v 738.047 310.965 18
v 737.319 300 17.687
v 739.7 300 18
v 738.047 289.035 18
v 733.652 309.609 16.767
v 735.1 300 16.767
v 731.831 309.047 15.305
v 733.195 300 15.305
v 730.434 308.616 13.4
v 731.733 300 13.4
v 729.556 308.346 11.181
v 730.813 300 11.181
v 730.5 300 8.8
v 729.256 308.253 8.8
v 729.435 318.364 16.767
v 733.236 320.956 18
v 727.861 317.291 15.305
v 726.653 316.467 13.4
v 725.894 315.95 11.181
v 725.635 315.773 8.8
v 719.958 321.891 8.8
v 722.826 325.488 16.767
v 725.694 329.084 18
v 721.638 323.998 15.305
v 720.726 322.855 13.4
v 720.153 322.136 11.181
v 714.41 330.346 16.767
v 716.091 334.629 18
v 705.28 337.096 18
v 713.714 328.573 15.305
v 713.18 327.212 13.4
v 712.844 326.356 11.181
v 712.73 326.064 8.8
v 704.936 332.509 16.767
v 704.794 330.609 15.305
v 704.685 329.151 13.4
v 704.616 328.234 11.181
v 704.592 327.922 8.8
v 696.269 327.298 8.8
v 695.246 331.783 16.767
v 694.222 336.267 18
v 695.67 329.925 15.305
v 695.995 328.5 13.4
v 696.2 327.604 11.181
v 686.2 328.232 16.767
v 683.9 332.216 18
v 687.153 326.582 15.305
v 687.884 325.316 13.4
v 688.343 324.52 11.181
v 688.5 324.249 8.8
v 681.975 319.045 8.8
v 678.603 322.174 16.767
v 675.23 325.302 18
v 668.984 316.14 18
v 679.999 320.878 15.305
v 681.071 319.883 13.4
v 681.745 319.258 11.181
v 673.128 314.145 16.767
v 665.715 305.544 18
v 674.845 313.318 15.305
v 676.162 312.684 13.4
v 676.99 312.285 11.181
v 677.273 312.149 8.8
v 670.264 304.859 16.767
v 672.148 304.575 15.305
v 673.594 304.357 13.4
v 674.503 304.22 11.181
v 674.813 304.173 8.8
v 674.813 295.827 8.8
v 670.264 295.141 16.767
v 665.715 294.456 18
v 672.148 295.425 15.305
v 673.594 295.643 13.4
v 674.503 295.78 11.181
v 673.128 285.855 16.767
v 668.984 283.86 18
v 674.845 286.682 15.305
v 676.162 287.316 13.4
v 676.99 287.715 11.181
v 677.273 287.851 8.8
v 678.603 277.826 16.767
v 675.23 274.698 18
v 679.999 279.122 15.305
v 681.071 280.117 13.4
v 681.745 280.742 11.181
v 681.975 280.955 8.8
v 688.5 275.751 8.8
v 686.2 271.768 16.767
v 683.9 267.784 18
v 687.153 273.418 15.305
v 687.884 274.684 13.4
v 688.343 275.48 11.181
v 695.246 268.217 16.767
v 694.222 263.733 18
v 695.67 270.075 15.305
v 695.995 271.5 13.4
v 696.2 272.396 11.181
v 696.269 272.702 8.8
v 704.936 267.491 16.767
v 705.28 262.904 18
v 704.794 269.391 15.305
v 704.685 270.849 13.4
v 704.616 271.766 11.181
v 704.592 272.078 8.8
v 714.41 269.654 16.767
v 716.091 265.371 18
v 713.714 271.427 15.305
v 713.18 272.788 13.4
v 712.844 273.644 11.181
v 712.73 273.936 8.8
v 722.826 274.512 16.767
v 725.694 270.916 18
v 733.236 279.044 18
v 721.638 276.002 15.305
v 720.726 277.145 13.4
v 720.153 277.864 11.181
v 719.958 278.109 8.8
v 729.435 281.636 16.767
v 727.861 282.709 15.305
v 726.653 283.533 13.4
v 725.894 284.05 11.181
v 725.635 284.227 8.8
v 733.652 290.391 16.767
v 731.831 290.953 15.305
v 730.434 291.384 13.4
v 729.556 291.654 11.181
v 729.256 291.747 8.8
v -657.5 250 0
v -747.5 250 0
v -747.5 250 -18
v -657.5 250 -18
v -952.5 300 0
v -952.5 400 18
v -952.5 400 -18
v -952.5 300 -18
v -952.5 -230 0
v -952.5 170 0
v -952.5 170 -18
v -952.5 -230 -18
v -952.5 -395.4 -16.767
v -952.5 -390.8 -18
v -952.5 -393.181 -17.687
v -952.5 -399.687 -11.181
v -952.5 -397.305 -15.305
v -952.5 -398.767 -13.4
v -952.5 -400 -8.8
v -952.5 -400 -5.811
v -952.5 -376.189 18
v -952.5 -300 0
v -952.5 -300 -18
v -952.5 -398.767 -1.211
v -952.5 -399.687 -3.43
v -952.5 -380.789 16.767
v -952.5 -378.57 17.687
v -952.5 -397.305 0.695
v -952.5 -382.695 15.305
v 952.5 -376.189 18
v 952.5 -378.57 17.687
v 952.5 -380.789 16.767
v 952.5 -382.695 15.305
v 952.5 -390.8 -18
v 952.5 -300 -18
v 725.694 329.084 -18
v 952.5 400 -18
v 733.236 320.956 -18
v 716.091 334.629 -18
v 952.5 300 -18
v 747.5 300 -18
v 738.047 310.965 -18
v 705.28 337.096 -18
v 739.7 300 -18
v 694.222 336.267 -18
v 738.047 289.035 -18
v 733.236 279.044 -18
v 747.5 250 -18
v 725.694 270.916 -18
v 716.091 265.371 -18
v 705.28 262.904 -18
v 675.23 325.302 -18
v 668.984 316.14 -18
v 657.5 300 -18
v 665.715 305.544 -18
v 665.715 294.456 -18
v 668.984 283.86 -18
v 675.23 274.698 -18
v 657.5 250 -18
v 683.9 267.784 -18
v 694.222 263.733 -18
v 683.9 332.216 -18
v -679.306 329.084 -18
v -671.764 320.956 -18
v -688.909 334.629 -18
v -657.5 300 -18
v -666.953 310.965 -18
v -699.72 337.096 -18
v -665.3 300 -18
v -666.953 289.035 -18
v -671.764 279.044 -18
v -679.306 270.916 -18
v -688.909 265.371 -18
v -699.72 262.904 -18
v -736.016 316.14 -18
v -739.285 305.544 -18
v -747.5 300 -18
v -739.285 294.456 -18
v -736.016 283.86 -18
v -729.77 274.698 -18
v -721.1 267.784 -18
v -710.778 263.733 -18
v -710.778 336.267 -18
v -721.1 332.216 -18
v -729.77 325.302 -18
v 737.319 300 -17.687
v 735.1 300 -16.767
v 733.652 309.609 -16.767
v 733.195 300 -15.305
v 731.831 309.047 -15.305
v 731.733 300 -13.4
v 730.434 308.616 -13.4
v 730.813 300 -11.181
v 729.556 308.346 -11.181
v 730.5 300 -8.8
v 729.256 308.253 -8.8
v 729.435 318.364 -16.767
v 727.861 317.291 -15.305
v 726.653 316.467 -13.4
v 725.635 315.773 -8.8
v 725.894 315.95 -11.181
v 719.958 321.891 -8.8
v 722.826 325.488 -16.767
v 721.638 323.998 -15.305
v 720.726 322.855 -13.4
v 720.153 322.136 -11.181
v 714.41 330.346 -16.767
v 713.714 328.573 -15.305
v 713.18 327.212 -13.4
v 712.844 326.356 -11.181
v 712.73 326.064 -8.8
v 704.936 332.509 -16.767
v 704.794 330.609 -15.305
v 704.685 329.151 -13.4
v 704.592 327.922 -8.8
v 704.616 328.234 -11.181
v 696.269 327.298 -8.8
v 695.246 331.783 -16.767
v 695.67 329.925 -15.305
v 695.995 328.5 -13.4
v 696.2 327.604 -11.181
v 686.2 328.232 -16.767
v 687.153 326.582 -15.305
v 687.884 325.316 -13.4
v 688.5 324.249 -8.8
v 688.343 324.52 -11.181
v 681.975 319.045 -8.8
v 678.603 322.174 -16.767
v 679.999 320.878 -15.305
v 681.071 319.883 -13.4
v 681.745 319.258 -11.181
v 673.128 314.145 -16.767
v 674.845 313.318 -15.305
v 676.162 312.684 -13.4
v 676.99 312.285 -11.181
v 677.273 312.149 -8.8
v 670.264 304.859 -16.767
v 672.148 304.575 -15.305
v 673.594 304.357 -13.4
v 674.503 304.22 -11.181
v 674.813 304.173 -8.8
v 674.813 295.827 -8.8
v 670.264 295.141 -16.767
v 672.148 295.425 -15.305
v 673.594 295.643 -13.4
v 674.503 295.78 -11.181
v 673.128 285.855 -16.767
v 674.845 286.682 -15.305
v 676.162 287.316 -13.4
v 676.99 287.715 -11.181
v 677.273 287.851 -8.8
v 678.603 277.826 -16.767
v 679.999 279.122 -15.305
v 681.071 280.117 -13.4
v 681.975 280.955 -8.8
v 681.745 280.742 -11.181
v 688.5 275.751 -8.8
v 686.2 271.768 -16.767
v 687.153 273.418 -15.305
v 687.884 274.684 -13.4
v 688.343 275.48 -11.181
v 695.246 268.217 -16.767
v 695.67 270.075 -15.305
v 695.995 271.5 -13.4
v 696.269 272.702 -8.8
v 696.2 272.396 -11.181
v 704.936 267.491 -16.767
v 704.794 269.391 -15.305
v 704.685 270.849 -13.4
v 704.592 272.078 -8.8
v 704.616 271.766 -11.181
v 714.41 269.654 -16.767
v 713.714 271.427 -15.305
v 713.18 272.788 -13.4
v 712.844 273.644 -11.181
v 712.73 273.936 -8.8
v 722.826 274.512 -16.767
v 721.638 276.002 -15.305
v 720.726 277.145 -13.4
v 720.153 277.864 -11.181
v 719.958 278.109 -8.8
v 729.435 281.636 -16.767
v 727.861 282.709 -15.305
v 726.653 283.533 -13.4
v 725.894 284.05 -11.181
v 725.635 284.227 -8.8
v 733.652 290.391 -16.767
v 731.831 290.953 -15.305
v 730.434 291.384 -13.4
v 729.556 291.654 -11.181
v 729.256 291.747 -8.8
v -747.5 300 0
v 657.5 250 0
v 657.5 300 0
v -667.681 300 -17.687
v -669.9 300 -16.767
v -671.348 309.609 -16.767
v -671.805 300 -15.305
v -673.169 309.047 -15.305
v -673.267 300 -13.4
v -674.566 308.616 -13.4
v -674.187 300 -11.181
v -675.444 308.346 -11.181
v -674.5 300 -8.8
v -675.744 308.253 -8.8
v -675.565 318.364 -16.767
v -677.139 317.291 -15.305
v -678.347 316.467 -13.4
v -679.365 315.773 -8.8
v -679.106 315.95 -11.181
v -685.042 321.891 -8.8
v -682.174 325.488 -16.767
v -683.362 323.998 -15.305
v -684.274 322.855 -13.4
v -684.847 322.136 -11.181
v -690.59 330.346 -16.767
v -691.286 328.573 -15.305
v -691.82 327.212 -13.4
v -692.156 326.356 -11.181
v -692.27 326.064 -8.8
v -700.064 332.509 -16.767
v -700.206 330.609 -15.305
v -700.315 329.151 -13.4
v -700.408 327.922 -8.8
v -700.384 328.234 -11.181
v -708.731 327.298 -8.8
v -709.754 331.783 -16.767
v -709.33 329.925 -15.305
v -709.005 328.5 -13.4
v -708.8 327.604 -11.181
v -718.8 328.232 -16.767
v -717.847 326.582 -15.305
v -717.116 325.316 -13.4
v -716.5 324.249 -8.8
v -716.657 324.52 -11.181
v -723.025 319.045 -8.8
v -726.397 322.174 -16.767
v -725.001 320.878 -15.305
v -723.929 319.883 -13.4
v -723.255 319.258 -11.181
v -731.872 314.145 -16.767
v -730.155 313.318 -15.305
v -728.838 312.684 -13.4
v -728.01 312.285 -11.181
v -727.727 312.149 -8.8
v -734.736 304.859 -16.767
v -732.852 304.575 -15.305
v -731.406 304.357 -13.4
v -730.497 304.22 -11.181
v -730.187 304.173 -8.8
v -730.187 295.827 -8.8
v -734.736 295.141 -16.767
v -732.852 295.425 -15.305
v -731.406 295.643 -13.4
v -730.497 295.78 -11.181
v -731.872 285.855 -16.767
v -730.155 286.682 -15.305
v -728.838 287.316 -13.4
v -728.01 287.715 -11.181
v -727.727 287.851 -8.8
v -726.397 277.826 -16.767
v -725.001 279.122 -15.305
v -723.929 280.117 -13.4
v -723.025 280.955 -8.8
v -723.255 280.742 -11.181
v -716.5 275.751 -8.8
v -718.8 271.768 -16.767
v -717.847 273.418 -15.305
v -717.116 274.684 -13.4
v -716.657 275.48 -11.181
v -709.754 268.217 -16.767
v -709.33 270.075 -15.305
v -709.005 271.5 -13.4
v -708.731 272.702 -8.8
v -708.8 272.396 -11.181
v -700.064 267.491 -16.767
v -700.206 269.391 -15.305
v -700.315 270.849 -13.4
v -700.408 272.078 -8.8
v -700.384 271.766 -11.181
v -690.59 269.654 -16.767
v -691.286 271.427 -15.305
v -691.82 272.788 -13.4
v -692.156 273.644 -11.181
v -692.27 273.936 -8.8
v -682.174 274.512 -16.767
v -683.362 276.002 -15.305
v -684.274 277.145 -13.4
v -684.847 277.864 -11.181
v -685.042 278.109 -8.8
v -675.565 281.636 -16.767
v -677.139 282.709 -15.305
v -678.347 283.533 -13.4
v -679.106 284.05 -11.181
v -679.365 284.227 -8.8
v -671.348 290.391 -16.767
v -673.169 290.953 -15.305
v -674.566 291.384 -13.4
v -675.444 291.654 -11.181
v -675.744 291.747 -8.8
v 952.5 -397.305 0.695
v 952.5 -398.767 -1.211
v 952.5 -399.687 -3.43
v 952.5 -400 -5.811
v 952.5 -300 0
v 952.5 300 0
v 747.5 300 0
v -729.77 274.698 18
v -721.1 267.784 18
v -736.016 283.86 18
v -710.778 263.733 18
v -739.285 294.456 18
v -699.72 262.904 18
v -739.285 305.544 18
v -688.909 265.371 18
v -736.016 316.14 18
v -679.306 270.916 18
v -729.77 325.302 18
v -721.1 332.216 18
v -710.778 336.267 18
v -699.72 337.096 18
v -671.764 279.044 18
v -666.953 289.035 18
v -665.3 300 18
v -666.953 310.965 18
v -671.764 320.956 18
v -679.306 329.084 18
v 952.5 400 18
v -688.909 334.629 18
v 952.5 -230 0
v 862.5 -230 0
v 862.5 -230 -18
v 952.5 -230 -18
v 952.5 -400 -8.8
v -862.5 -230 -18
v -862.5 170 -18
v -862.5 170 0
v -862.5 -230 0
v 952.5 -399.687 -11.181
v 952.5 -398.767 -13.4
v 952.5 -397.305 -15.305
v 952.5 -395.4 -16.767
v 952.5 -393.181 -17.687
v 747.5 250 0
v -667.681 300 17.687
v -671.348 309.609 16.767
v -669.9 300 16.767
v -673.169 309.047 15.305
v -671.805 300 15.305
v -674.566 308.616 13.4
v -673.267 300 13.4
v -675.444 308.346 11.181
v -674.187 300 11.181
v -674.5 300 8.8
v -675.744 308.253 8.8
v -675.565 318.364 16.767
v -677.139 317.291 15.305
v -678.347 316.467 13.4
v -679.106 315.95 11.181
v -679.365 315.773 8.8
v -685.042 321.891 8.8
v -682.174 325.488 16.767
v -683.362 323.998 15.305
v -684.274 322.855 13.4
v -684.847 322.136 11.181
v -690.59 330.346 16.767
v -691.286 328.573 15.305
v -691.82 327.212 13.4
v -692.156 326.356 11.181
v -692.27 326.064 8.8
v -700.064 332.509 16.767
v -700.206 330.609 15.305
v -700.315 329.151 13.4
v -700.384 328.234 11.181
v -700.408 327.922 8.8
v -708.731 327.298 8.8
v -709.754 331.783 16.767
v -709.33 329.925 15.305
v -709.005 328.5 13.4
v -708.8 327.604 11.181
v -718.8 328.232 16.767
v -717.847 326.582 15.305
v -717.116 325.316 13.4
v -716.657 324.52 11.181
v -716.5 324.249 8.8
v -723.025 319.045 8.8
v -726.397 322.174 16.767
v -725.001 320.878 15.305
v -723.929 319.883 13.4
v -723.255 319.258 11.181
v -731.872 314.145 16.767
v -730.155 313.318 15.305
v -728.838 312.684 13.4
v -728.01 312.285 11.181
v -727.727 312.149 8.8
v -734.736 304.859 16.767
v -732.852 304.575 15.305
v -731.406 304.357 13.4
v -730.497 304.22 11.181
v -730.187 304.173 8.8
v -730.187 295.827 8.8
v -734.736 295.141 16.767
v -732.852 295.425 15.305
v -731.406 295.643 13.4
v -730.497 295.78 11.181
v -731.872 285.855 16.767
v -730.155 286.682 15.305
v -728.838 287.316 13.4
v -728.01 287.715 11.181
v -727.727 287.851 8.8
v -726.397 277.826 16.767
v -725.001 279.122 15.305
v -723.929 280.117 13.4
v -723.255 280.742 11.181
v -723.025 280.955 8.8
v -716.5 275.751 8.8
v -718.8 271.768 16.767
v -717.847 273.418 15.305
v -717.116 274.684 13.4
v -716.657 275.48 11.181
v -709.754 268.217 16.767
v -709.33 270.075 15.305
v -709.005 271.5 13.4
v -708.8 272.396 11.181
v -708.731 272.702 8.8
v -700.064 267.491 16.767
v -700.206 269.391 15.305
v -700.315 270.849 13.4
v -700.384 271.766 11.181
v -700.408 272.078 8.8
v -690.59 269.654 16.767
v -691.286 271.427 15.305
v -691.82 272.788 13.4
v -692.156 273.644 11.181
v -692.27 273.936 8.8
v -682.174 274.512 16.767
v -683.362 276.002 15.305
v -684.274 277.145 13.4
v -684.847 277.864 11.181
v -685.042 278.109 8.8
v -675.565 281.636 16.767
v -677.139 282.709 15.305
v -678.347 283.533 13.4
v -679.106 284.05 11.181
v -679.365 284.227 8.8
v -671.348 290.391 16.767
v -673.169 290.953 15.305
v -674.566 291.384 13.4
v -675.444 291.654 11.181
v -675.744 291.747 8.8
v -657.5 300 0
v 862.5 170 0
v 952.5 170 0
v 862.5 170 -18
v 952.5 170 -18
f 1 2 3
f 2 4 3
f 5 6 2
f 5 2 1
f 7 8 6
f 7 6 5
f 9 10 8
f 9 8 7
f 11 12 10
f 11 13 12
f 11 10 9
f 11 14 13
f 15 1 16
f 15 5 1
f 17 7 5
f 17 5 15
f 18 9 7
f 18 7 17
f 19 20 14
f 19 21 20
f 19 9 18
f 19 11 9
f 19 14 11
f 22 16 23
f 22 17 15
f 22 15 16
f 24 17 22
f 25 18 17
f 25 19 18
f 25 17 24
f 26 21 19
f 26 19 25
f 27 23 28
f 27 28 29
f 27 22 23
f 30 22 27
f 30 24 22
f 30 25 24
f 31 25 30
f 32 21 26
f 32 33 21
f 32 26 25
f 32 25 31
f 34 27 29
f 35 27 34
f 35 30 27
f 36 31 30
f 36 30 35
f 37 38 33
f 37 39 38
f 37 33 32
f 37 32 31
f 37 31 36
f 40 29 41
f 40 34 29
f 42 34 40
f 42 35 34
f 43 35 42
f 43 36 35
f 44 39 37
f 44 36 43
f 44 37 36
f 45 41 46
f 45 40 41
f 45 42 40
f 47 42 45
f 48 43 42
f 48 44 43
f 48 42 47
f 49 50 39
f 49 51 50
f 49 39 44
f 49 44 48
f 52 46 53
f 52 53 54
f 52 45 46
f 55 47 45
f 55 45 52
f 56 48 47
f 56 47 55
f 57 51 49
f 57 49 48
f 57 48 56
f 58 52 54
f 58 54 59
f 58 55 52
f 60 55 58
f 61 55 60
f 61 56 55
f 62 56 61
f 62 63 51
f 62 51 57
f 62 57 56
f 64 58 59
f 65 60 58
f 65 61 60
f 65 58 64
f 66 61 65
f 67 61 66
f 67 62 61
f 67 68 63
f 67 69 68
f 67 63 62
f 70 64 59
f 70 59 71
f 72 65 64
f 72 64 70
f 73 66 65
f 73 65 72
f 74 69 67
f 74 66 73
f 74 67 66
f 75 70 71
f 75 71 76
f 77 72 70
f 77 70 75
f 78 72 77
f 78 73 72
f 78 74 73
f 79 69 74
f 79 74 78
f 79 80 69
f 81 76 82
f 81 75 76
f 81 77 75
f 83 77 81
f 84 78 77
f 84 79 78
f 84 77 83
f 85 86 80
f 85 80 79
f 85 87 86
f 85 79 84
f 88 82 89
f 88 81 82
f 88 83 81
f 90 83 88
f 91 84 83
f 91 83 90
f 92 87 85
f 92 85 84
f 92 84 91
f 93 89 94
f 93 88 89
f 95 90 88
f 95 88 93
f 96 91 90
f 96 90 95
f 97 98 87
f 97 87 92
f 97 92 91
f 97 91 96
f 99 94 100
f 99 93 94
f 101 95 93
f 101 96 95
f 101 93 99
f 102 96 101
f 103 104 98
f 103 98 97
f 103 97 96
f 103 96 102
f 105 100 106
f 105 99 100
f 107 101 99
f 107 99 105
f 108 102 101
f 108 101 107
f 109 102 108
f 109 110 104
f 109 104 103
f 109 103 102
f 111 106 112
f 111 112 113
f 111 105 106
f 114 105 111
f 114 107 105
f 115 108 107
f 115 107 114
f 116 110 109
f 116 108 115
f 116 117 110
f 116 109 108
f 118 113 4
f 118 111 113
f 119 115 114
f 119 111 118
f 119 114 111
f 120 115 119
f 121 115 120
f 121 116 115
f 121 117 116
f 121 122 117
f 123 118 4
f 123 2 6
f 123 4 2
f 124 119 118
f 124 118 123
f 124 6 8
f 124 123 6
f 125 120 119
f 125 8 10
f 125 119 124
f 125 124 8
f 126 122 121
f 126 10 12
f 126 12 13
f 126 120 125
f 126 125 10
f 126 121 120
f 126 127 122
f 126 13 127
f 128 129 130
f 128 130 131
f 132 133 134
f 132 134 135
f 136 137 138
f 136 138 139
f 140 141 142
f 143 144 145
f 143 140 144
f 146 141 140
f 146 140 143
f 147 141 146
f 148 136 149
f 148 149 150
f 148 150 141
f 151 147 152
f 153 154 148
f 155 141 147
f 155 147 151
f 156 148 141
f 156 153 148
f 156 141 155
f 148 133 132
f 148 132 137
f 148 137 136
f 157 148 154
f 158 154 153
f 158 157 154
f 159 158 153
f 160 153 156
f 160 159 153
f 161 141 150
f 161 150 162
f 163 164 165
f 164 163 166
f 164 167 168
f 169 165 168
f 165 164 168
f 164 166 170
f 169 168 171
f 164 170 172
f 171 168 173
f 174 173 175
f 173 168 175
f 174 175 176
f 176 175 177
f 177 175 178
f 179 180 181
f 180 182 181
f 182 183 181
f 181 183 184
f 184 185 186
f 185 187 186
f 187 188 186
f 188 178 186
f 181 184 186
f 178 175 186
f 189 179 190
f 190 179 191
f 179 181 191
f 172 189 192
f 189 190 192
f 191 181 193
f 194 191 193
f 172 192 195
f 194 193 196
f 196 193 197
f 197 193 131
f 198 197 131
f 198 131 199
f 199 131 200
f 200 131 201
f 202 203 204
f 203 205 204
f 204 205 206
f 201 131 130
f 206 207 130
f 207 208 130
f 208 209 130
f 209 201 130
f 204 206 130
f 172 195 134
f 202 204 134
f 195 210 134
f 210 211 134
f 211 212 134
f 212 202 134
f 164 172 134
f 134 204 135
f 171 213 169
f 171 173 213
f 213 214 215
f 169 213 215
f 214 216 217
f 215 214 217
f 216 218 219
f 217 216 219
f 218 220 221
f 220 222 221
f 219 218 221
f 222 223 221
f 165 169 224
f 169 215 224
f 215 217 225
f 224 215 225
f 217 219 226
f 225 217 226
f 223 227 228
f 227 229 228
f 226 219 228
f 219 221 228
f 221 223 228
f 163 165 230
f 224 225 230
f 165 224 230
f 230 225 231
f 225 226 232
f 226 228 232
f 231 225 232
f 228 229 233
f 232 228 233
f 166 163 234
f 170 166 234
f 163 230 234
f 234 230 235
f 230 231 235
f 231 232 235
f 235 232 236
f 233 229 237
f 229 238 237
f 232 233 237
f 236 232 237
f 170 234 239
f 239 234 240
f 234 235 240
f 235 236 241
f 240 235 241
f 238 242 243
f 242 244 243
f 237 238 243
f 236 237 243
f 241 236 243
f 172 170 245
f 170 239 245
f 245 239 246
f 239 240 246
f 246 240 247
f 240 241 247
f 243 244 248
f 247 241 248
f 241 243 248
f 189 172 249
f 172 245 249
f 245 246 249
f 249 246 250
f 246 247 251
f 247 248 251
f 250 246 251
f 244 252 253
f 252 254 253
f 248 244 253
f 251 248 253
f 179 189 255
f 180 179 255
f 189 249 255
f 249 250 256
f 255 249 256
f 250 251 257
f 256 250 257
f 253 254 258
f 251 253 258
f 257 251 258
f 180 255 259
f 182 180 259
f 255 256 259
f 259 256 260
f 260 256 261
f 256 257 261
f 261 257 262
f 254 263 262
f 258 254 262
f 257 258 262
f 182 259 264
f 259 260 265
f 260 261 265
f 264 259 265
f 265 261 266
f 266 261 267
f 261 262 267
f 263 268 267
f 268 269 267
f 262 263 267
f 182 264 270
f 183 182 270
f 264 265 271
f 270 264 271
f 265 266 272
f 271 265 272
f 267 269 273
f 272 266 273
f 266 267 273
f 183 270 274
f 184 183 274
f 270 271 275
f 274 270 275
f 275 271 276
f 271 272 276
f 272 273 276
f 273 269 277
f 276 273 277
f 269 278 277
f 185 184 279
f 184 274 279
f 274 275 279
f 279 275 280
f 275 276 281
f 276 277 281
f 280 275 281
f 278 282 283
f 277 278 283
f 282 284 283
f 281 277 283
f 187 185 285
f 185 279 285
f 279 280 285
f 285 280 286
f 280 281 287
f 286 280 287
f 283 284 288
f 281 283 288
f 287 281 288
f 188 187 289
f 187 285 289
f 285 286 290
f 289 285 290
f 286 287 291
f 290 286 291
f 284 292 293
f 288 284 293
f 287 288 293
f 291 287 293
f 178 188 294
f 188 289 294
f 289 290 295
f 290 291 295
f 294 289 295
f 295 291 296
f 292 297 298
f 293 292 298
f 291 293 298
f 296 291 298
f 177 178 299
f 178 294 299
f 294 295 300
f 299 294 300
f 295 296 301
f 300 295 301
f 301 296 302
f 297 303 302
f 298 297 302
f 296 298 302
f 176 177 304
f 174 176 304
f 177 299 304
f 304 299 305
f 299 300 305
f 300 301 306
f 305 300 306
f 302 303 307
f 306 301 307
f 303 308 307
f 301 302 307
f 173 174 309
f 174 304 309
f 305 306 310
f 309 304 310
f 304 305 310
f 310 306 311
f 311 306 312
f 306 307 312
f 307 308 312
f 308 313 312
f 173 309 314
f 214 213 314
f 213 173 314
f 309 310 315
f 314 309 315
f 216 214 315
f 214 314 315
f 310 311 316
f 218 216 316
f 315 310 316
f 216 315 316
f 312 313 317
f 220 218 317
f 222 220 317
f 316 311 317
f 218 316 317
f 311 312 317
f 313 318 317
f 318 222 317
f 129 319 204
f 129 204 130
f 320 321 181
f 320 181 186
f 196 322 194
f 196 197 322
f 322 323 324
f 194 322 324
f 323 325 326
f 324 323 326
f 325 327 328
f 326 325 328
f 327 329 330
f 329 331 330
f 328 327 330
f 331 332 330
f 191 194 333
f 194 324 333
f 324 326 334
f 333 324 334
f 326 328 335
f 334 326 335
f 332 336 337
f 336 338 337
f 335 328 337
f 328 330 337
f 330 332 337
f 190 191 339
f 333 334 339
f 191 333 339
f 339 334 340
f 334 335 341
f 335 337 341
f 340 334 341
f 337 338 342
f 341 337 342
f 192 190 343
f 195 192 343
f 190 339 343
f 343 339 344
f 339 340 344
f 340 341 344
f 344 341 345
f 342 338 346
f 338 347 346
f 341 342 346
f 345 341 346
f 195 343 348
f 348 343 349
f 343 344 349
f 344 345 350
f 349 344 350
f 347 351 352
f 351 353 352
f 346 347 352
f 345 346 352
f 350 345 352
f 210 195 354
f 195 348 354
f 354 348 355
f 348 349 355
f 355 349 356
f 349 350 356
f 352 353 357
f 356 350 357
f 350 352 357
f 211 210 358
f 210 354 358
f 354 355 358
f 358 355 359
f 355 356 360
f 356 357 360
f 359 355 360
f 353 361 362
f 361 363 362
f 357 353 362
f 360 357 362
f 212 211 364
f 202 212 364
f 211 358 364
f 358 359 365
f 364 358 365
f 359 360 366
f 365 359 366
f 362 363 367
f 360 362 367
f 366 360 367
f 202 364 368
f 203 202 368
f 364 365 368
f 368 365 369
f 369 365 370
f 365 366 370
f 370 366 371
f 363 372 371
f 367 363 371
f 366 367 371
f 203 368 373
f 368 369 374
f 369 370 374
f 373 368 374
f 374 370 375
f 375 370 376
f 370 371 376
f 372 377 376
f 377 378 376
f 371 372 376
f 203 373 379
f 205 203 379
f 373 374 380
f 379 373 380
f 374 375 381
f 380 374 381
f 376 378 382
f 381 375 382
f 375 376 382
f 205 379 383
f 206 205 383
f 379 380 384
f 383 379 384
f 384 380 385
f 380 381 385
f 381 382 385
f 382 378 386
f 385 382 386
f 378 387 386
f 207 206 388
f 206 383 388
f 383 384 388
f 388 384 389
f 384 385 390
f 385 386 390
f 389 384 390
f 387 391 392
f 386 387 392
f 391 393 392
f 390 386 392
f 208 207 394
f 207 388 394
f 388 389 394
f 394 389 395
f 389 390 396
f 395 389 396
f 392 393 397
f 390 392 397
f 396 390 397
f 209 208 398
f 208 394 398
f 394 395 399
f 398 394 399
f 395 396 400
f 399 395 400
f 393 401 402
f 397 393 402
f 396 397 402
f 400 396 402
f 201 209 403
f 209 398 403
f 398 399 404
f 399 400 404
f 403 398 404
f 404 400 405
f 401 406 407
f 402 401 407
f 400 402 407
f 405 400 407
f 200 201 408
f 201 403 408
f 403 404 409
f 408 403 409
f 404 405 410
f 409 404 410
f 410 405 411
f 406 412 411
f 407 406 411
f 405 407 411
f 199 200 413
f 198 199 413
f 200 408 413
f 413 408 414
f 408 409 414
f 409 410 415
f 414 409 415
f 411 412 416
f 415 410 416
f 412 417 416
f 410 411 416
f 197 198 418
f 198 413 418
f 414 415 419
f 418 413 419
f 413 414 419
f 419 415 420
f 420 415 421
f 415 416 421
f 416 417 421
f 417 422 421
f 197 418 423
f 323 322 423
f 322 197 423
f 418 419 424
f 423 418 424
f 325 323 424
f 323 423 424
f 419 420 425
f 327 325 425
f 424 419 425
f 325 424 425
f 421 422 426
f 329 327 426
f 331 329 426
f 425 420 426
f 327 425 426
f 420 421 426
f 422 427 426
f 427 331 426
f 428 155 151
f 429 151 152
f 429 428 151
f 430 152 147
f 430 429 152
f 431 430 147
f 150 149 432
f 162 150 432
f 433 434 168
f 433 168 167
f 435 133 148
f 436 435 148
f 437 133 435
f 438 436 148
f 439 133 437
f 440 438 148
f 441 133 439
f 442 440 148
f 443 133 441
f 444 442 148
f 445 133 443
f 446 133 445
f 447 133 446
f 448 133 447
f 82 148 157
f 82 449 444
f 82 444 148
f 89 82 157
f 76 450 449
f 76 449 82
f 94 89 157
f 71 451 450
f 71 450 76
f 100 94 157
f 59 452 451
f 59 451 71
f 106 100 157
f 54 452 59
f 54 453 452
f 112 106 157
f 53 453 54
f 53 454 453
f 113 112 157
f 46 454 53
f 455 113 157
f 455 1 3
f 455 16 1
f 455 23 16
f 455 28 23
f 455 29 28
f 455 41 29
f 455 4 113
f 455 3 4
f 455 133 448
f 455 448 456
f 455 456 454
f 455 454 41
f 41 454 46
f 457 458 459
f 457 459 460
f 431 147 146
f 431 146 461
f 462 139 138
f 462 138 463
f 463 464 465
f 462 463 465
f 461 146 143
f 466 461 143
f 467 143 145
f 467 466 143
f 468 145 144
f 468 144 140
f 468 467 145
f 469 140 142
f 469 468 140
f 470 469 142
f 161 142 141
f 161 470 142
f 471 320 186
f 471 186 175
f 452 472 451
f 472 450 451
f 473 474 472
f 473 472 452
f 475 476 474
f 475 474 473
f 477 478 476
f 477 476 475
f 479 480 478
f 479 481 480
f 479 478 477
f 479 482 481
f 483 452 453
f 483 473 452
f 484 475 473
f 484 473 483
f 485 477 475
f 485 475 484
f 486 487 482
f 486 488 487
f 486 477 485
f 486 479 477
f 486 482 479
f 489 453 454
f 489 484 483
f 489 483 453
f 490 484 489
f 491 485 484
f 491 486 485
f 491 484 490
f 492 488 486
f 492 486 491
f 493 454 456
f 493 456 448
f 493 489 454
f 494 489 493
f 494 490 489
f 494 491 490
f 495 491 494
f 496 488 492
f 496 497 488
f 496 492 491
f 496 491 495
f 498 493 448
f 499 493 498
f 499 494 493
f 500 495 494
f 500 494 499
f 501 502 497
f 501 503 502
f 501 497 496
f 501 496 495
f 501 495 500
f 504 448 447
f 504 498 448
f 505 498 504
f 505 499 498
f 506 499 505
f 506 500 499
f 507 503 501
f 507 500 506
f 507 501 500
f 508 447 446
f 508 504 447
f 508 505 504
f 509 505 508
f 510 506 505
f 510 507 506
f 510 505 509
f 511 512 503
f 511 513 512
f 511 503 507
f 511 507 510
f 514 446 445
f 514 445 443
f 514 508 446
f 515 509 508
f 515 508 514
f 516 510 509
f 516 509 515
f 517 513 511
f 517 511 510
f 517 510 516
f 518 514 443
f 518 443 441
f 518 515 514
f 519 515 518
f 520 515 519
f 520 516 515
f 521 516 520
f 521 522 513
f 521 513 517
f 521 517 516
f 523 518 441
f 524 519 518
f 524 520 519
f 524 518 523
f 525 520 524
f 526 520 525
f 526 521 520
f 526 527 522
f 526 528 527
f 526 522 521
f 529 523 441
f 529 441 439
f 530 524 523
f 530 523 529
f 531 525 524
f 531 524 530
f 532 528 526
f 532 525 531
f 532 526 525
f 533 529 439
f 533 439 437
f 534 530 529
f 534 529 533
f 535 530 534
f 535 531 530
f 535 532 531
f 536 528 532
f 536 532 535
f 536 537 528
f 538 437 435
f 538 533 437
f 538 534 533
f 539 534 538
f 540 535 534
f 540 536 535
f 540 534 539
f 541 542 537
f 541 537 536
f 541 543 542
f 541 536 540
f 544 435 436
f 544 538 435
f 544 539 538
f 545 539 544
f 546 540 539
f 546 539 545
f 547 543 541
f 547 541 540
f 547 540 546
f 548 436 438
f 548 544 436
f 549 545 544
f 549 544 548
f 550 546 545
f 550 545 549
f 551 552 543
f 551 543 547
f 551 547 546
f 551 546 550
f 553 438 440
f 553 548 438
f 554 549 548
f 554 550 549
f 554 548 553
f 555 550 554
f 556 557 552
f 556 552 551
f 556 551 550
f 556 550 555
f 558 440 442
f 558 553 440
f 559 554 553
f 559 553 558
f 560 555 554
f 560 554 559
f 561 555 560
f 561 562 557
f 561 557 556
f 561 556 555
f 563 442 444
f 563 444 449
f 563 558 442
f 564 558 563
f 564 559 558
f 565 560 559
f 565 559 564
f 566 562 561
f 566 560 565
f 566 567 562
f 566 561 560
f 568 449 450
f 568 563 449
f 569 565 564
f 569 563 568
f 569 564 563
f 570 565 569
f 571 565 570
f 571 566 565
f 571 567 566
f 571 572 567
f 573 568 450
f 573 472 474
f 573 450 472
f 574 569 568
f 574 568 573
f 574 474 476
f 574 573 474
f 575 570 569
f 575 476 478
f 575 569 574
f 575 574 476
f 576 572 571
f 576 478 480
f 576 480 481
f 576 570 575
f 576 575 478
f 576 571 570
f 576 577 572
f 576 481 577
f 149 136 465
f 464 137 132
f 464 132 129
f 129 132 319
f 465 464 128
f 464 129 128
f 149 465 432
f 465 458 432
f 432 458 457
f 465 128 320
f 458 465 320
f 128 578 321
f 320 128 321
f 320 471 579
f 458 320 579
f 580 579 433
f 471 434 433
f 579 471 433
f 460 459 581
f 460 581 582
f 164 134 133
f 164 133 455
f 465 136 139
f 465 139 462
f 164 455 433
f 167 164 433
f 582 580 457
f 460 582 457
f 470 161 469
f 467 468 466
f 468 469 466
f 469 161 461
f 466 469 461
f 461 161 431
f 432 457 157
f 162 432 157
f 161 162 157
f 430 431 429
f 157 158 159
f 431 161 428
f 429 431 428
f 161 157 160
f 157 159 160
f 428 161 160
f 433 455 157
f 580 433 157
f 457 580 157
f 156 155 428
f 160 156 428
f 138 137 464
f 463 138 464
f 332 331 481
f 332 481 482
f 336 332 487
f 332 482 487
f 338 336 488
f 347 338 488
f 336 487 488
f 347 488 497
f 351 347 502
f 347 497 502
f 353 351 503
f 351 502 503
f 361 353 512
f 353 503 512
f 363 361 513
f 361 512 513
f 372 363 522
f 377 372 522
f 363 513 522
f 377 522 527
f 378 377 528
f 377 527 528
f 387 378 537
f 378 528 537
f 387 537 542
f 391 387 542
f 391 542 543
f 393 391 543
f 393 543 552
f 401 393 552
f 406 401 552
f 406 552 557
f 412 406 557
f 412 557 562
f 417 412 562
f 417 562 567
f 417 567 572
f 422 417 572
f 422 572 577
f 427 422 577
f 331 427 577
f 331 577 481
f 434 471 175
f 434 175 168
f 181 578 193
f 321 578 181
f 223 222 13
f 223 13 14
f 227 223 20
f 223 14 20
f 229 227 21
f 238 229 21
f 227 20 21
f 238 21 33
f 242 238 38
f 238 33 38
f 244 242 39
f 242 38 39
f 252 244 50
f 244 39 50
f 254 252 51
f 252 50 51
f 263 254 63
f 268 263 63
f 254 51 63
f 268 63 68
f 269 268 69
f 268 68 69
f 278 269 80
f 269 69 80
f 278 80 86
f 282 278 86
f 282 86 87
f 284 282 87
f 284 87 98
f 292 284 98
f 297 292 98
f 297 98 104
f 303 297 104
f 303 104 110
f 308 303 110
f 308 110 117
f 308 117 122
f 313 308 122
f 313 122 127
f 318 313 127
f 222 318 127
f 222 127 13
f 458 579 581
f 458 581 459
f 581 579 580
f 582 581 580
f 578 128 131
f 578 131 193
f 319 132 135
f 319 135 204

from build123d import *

# Parameters (mm, degrees)
SKETCH004_W   = 1905
SKETCH004_H   = 800
PAD001_DEPTH  = 18
SKETCH006_W   = 1905
SKETCH006_H   = 100
SKETCH006_W_2 = 90
SKETCH006_H_2 = 400
PAD002_DEPTH  = 18
SKETCH005_R   = 28
POCKET_DEPTH  = 40
FILLET002_R   = 9.2
CHAMFER_SIZE  = 20
FILLET003_R   = 9.2


with BuildPart() as part:
    # Sketch004 → Pad001 (new body)
    with BuildSketch(Plane.XY):
        Rectangle(SKETCH004_W, SKETCH004_H)
    extrude(amount=PAD001_DEPTH)

    # Sketch006 (on Face5 of Pad001) → Pad002 (join)
    with BuildSketch(Plane(origin=(0, 0, 0), x_dir=(1, 0, 0), z_dir=(0, 0, -1))):
        with Locations((0, 350)):
            Rectangle(SKETCH006_W, SKETCH006_H)
        Polygon((952.5, -300), (952.5, -400), (-952.5, -400), (-952.5, -300), (-747.5, -300), (-747.5, -250), (-657.5, -250), (-657.5, -300), (657.5, -300), (657.5, -250), (747.5, -250), (747.5, -300), align=None)
        with Locations((-907.5, 30)):
            Rectangle(SKETCH006_W_2, SKETCH006_H_2)
        with Locations((907.5, 30)):
            Rectangle(SKETCH006_W_2, SKETCH006_H_2)
    extrude(amount=PAD002_DEPTH)

    # Sketch005 (on Face6 of Pad001) → Pocket (cut)
    with BuildSketch(Plane.XY.offset(18)):
        with Locations((-702.5, 300)):
            Circle(SKETCH005_R)
        with Locations((702.5, 300)):
            Circle(SKETCH005_R)
    extrude(amount=-POCKET_DEPTH, mode=Mode.SUBTRACT)

    # Fillet002
    fillet002_edges = [part.edges().sort_by_distance(p)[0] for p in [
        (674.5, 300, -18),
        (-730.5, 300, -18),
        (-730.5, 300, 18),
        (674.5, 300, 18),
    ]]
    fillet(fillet002_edges, radius=FILLET002_R)

    # Chamfer
    chamfer_edges = [part.edges().sort_by_distance(p)[0] for p in [
        (0, -400, 18),
    ]]
    chamfer(chamfer_edges, length=CHAMFER_SIZE)

    # Fillet003
    fillet003_edges = [part.edges().sort_by_distance(p)[0] for p in [
        (0, -400, -18),
        (0, -400, -2),
        (0, -380, 18),
    ]]
    fillet(fillet003_edges, radius=FILLET003_R)


solid = part.part
